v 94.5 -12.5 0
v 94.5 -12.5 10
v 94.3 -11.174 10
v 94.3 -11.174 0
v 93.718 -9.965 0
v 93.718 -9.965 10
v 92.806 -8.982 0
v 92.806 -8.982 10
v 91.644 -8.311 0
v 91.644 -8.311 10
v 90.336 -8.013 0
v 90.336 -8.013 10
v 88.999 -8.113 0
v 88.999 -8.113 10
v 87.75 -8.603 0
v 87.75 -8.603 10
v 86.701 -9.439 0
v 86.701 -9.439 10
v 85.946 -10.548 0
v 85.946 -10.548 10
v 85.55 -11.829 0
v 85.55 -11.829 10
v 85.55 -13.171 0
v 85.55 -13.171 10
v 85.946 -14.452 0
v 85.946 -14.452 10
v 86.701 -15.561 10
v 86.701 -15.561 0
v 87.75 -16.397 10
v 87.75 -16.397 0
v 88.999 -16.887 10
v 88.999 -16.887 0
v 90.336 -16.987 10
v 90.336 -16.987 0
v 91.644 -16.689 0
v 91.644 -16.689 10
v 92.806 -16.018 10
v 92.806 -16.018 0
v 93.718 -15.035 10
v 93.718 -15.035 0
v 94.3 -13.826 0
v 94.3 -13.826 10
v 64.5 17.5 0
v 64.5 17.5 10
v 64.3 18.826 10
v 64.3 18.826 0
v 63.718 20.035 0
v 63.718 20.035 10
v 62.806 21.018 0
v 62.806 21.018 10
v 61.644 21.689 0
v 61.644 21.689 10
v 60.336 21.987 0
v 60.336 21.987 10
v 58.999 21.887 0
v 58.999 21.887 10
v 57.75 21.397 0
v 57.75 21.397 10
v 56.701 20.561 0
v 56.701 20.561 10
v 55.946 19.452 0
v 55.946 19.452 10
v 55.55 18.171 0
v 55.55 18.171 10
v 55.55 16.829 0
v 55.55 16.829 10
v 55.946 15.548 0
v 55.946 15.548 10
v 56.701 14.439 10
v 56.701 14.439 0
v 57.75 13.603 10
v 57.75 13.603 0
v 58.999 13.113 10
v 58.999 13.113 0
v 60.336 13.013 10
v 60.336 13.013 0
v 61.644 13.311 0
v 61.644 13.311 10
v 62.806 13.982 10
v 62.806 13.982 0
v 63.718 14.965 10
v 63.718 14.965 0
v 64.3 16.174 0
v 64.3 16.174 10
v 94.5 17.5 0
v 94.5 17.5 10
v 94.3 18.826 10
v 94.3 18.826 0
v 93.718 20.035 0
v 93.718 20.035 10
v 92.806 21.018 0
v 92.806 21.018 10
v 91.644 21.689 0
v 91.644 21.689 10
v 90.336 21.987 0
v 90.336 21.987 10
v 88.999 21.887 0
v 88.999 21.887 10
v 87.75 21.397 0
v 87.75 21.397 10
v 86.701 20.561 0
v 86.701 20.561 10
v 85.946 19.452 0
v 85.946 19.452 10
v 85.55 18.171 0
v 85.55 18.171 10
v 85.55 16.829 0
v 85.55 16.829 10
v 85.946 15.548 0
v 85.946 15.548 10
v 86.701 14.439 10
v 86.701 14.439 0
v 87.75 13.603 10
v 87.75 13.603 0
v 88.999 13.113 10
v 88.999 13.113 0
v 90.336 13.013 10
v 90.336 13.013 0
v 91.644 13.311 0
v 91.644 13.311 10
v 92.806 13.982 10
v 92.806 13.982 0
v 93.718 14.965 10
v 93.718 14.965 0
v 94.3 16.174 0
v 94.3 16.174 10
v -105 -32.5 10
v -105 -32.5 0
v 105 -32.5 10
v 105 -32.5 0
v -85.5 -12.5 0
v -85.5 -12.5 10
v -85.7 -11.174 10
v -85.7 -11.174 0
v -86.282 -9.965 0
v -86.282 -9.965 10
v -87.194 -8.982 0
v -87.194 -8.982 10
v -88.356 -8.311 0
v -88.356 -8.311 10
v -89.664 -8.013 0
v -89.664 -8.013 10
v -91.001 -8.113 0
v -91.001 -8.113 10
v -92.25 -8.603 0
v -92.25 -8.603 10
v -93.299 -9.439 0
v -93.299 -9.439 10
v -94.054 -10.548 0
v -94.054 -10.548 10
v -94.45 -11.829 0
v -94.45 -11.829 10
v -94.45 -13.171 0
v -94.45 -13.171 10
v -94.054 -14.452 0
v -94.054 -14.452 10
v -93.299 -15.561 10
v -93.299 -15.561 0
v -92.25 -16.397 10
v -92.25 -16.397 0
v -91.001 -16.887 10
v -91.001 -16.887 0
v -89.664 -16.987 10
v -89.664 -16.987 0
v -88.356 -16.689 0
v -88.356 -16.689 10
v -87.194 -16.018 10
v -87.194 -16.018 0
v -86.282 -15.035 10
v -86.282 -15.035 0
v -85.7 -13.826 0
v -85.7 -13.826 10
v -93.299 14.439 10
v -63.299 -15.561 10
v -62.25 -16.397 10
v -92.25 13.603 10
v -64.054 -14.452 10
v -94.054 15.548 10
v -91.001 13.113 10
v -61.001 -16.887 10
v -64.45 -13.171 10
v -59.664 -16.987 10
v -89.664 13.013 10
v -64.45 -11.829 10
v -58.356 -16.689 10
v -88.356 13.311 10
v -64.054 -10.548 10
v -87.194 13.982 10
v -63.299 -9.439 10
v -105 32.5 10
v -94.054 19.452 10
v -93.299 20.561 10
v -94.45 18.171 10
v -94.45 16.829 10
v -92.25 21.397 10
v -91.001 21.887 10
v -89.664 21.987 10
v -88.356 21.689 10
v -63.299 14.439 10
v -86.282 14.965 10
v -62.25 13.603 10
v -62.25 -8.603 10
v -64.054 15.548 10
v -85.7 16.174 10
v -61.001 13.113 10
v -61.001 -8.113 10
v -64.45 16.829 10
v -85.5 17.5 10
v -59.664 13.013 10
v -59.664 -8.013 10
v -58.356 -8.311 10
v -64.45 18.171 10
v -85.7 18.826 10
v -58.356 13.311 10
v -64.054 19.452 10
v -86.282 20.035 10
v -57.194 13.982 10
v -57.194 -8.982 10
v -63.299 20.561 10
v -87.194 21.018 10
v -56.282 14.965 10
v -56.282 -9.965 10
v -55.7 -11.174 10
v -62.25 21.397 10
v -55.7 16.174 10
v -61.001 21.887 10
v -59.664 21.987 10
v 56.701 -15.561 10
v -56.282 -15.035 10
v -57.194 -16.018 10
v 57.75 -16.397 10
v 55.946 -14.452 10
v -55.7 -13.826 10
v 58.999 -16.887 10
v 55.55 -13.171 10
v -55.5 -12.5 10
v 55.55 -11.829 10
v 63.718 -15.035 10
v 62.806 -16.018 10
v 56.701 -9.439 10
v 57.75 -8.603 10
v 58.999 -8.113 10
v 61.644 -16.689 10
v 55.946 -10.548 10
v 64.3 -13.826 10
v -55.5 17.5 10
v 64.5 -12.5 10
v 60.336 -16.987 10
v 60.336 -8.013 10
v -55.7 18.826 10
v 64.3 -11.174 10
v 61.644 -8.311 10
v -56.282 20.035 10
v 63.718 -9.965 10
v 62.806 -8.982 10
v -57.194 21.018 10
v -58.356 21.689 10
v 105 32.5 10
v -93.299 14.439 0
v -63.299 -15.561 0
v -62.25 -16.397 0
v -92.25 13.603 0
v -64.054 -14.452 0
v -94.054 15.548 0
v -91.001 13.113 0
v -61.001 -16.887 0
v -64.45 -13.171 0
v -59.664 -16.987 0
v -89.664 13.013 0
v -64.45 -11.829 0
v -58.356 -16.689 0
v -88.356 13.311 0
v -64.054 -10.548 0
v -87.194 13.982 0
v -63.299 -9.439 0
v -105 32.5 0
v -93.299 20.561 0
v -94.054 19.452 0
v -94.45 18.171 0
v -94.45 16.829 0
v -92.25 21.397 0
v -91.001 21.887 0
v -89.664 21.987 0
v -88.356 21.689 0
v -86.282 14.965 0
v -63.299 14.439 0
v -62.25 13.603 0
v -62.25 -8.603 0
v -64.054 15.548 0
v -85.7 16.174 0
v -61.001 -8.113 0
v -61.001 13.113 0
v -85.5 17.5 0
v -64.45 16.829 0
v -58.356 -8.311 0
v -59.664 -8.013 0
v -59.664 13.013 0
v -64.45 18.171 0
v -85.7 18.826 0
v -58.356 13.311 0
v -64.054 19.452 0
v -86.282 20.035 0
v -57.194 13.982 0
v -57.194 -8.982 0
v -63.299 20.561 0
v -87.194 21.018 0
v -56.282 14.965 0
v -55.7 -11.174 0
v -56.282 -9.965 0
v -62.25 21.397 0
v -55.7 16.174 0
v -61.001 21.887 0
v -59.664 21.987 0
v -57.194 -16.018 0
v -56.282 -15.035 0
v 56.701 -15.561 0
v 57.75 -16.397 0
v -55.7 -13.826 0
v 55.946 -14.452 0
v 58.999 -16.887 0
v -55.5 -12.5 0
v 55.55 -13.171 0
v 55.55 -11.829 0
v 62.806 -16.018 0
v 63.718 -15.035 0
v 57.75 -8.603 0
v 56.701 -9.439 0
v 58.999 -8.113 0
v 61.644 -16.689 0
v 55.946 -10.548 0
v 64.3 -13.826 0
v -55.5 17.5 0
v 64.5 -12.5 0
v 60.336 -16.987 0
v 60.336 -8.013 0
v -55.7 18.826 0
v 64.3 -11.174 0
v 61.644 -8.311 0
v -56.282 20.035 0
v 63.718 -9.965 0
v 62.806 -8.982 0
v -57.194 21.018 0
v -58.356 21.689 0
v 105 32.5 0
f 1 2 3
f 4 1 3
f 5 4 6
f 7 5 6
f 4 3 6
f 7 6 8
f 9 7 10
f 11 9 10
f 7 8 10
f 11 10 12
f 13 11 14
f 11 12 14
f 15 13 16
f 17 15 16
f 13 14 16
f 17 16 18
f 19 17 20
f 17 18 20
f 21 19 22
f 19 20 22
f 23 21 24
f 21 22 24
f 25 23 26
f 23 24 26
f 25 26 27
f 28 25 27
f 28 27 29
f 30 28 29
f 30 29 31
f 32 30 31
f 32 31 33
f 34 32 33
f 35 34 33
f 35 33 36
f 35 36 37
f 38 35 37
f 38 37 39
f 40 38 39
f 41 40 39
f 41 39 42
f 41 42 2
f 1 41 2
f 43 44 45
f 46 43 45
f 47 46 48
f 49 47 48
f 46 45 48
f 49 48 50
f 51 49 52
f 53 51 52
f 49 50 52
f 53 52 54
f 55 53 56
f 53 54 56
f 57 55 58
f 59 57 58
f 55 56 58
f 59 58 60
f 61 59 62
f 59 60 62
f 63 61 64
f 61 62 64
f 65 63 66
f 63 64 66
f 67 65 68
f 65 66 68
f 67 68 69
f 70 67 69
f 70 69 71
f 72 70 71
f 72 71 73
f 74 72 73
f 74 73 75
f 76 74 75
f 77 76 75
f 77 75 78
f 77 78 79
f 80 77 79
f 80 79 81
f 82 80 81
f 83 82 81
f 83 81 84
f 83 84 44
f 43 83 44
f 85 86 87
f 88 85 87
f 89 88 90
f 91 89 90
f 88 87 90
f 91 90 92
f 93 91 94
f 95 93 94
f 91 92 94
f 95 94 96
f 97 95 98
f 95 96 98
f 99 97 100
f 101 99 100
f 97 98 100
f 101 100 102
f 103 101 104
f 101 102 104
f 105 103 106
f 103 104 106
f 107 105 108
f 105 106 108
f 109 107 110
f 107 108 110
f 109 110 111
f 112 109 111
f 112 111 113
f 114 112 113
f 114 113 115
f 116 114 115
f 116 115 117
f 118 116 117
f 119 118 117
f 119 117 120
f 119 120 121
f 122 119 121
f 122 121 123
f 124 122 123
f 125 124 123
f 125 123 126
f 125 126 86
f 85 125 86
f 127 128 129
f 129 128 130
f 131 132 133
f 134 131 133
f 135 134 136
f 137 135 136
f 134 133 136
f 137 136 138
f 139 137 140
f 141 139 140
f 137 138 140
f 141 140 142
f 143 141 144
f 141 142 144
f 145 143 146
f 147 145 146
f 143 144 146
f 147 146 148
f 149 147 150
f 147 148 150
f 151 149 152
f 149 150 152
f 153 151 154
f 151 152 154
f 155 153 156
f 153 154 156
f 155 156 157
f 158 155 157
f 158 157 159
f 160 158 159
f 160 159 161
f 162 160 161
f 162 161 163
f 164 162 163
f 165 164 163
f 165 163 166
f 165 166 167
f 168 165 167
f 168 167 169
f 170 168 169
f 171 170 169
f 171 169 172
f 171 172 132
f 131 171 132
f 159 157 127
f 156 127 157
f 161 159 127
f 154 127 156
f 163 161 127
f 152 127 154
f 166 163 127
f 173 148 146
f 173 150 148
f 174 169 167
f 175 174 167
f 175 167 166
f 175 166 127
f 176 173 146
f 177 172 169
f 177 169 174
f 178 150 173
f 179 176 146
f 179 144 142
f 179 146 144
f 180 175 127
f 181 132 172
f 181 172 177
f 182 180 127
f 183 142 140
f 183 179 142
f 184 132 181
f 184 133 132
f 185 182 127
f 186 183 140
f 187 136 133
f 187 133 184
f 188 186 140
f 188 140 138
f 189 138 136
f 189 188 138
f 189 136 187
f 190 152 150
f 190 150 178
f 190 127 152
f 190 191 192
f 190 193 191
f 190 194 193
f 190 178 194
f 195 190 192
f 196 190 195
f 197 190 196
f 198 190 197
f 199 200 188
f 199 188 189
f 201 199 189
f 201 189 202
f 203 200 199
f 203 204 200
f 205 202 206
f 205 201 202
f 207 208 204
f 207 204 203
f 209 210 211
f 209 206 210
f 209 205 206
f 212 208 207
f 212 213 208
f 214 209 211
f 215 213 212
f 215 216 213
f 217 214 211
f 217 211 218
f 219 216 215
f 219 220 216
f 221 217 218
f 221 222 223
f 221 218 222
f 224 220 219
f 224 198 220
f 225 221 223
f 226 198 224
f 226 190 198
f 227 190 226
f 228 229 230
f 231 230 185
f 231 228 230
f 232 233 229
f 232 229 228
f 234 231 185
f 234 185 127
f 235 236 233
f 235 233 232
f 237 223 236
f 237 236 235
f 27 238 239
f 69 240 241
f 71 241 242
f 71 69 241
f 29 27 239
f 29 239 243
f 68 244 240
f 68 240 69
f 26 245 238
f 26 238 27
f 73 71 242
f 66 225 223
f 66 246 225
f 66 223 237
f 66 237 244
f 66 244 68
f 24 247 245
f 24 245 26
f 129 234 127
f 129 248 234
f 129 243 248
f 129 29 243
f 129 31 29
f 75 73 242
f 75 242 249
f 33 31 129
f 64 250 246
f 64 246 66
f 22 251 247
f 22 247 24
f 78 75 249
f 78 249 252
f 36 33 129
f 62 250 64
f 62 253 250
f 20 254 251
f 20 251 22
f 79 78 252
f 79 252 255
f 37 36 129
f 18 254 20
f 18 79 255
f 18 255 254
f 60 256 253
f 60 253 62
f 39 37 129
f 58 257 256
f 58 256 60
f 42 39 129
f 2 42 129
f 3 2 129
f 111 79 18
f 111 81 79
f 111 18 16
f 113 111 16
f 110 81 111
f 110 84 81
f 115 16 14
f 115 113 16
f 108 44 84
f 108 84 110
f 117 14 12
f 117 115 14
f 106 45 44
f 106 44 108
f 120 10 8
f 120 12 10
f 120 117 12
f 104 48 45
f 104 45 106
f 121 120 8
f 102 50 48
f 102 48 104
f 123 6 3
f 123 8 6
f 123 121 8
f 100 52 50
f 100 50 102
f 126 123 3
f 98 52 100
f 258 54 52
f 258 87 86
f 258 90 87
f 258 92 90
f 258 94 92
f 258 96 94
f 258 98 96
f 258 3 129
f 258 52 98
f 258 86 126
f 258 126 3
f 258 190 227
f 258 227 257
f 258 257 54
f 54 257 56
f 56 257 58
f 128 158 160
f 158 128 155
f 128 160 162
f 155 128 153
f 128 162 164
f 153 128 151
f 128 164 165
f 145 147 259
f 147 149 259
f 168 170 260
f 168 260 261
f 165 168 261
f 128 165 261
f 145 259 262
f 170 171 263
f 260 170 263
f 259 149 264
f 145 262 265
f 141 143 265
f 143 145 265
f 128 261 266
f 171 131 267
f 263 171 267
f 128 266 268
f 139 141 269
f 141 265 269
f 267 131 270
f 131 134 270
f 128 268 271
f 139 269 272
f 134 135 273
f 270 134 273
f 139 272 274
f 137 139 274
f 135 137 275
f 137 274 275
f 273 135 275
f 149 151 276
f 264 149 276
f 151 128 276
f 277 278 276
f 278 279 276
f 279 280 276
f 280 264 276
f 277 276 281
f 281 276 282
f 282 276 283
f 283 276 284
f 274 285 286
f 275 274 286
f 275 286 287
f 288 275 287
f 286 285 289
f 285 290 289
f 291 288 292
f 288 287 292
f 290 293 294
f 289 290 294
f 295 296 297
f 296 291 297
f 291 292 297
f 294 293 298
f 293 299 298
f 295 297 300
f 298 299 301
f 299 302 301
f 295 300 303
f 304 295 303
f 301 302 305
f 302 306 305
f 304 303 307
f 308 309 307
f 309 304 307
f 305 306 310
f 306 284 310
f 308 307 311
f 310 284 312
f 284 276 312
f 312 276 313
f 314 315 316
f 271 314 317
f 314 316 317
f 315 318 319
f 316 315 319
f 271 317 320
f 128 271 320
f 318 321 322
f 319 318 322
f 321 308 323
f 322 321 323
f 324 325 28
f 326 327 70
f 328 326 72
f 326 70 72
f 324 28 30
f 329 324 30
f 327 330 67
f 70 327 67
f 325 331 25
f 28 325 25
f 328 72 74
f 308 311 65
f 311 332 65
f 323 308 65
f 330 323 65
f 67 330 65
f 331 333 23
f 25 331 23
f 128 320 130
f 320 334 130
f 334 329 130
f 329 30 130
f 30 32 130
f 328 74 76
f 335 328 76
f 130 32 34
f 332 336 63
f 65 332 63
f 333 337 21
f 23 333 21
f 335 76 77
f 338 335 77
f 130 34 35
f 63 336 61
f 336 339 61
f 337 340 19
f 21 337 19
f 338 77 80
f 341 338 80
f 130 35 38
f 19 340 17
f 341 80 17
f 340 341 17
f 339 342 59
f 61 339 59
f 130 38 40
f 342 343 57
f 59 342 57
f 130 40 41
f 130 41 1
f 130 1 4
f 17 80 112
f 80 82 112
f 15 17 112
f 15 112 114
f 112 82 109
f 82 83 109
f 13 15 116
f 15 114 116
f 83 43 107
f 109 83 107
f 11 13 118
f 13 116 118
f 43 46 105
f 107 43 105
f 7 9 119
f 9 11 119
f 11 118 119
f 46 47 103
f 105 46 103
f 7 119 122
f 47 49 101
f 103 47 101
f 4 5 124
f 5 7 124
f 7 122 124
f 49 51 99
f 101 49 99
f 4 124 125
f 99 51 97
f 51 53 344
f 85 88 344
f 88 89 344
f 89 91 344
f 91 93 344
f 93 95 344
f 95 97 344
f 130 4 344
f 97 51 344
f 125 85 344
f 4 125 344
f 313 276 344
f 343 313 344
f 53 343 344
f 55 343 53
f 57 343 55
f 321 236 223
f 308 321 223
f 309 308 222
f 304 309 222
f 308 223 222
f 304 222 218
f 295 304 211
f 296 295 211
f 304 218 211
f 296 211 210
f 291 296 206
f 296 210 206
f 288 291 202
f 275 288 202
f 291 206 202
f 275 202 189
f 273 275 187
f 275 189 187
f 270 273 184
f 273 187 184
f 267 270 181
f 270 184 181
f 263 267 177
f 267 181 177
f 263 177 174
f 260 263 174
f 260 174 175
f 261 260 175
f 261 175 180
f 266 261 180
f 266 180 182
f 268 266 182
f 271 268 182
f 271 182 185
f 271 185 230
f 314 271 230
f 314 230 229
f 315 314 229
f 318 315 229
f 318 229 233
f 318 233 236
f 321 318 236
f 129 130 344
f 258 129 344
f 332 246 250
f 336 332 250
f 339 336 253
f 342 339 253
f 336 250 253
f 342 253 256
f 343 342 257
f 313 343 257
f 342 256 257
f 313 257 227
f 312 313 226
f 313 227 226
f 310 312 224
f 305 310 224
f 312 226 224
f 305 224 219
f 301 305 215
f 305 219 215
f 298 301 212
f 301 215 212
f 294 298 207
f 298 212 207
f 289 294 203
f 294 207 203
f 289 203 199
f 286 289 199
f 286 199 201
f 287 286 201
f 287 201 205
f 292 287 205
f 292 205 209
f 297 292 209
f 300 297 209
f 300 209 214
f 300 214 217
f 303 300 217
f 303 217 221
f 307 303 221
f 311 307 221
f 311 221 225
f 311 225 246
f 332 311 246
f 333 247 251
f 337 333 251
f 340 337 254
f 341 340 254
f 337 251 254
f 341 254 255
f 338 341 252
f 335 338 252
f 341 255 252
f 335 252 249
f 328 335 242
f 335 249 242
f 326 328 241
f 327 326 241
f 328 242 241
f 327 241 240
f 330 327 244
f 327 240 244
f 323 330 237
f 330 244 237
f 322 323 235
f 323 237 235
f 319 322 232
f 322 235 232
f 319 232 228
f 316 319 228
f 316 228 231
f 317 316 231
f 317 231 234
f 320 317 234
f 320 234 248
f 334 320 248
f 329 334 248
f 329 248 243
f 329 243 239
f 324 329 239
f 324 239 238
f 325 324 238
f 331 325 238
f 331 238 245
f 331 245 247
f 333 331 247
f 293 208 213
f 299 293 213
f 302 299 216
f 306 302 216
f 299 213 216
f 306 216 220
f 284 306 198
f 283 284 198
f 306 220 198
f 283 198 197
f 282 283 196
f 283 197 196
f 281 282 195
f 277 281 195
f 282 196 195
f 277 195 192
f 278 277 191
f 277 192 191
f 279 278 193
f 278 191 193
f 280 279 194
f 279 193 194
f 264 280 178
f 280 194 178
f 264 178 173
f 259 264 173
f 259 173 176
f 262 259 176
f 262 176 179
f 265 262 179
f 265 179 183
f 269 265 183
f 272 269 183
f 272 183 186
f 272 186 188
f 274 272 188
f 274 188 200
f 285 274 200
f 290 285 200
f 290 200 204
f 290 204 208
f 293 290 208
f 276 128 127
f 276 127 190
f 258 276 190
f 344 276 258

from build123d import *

# Parameters (mm, degrees)
SKETCH1_W           = 210
SKETCH1_H           = 65
BOSS_EXTRUDE1_DEPTH = 10
CUT_EXTRUDE1_REACH  = 112.369
SKETCH2_R           = 4.5


with BuildPart() as part:
    # Sketch1 → Boss-Extrude1 (new body)
    with BuildSketch(Plane.XY):
        Rectangle(SKETCH1_W, SKETCH1_H)
    extrude(amount=BOSS_EXTRUDE1_DEPTH)

    # Sketch2 → Cut-Extrude1 (cut, up to next)
    with BuildSketch(Plane.XY.offset(10), mode=Mode.PRIVATE) as cut_extrude1_sk1:
        with Locations((-90, -12.5)):
            Circle(SKETCH2_R)
    cut_extrude1_tool1 = extrude(cut_extrude1_sk1.sketch, amount=-CUT_EXTRUDE1_REACH, mode=Mode.PRIVATE) & part.part
    # Sketch2 → Cut-Extrude1 (cut, up to next)
    with BuildSketch(Plane.XY.offset(10), mode=Mode.PRIVATE) as cut_extrude1_sk2:
        with Locations((-90, 17.5)):
            Circle(SKETCH2_R)
    cut_extrude1_tool2 = extrude(cut_extrude1_sk2.sketch, amount=-CUT_EXTRUDE1_REACH, mode=Mode.PRIVATE) & part.part
    # Sketch2 → Cut-Extrude1 (cut, up to next)
    with BuildSketch(Plane.XY.offset(10), mode=Mode.PRIVATE) as cut_extrude1_sk3:
        with Locations((-60, 17.5)):
            Circle(SKETCH2_R)
    cut_extrude1_tool3 = extrude(cut_extrude1_sk3.sketch, amount=-CUT_EXTRUDE1_REACH, mode=Mode.PRIVATE) & part.part
    # Sketch2 → Cut-Extrude1 (cut, up to next)
    with BuildSketch(Plane.XY.offset(10), mode=Mode.PRIVATE) as cut_extrude1_sk4:
        with Locations((-60, -12.5)):
            Circle(SKETCH2_R)
    cut_extrude1_tool4 = extrude(cut_extrude1_sk4.sketch, amount=-CUT_EXTRUDE1_REACH, mode=Mode.PRIVATE) & part.part
    # Sketch2 → Cut-Extrude1 (cut, up to next)
    with BuildSketch(Plane.XY.offset(10), mode=Mode.PRIVATE) as cut_extrude1_sk5:
        with Locations((60, 17.5)):
            Circle(SKETCH2_R)
    cut_extrude1_tool5 = extrude(cut_extrude1_sk5.sketch, amount=-CUT_EXTRUDE1_REACH, mode=Mode.PRIVATE) & part.part
    # Sketch2 → Cut-Extrude1 (cut, up to next)
    with BuildSketch(Plane.XY.offset(10), mode=Mode.PRIVATE) as cut_extrude1_sk6:
        with Locations((90, 17.5)):
            Circle(SKETCH2_R)
    cut_extrude1_tool6 = extrude(cut_extrude1_sk6.sketch, amount=-CUT_EXTRUDE1_REACH, mode=Mode.PRIVATE) & part.part
    # Sketch2 → Cut-Extrude1 (cut, up to next)
    with BuildSketch(Plane.XY.offset(10), mode=Mode.PRIVATE) as cut_extrude1_sk7:
        with Locations((60, -12.5)):
            Circle(SKETCH2_R)
    cut_extrude1_tool7 = extrude(cut_extrude1_sk7.sketch, amount=-CUT_EXTRUDE1_REACH, mode=Mode.PRIVATE) & part.part
    # Sketch2 → Cut-Extrude1 (cut, up to next)
    with BuildSketch(Plane.XY.offset(10), mode=Mode.PRIVATE) as cut_extrude1_sk8:
        with Locations((90, -12.5)):
            Circle(SKETCH2_R)
    cut_extrude1_tool8 = extrude(cut_extrude1_sk8.sketch, amount=-CUT_EXTRUDE1_REACH, mode=Mode.PRIVATE) & part.part
    add(cut_extrude1_tool1.solids().sort_by_distance((-90, -12.5, 10))[0], mode=Mode.SUBTRACT)
    add(cut_extrude1_tool2.solids().sort_by_distance((-90, 17.5, 10))[0], mode=Mode.SUBTRACT)
    add(cut_extrude1_tool3.solids().sort_by_distance((-60, 17.5, 10))[0], mode=Mode.SUBTRACT)
    add(cut_extrude1_tool4.solids().sort_by_distance((-60, -12.5, 10))[0], mode=Mode.SUBTRACT)
    add(cut_extrude1_tool5.solids().sort_by_distance((60, 17.5, 10))[0], mode=Mode.SUBTRACT)
    add(cut_extrude1_tool6.solids().sort_by_distance((90, 17.5, 10))[0], mode=Mode.SUBTRACT)
    add(cut_extrude1_tool7.solids().sort_by_distance((60, -12.5, 10))[0], mode=Mode.SUBTRACT)
    add(cut_extrude1_tool8.solids().sort_by_distance((90, -12.5, 10))[0], mode=Mode.SUBTRACT)


solid = part.part
